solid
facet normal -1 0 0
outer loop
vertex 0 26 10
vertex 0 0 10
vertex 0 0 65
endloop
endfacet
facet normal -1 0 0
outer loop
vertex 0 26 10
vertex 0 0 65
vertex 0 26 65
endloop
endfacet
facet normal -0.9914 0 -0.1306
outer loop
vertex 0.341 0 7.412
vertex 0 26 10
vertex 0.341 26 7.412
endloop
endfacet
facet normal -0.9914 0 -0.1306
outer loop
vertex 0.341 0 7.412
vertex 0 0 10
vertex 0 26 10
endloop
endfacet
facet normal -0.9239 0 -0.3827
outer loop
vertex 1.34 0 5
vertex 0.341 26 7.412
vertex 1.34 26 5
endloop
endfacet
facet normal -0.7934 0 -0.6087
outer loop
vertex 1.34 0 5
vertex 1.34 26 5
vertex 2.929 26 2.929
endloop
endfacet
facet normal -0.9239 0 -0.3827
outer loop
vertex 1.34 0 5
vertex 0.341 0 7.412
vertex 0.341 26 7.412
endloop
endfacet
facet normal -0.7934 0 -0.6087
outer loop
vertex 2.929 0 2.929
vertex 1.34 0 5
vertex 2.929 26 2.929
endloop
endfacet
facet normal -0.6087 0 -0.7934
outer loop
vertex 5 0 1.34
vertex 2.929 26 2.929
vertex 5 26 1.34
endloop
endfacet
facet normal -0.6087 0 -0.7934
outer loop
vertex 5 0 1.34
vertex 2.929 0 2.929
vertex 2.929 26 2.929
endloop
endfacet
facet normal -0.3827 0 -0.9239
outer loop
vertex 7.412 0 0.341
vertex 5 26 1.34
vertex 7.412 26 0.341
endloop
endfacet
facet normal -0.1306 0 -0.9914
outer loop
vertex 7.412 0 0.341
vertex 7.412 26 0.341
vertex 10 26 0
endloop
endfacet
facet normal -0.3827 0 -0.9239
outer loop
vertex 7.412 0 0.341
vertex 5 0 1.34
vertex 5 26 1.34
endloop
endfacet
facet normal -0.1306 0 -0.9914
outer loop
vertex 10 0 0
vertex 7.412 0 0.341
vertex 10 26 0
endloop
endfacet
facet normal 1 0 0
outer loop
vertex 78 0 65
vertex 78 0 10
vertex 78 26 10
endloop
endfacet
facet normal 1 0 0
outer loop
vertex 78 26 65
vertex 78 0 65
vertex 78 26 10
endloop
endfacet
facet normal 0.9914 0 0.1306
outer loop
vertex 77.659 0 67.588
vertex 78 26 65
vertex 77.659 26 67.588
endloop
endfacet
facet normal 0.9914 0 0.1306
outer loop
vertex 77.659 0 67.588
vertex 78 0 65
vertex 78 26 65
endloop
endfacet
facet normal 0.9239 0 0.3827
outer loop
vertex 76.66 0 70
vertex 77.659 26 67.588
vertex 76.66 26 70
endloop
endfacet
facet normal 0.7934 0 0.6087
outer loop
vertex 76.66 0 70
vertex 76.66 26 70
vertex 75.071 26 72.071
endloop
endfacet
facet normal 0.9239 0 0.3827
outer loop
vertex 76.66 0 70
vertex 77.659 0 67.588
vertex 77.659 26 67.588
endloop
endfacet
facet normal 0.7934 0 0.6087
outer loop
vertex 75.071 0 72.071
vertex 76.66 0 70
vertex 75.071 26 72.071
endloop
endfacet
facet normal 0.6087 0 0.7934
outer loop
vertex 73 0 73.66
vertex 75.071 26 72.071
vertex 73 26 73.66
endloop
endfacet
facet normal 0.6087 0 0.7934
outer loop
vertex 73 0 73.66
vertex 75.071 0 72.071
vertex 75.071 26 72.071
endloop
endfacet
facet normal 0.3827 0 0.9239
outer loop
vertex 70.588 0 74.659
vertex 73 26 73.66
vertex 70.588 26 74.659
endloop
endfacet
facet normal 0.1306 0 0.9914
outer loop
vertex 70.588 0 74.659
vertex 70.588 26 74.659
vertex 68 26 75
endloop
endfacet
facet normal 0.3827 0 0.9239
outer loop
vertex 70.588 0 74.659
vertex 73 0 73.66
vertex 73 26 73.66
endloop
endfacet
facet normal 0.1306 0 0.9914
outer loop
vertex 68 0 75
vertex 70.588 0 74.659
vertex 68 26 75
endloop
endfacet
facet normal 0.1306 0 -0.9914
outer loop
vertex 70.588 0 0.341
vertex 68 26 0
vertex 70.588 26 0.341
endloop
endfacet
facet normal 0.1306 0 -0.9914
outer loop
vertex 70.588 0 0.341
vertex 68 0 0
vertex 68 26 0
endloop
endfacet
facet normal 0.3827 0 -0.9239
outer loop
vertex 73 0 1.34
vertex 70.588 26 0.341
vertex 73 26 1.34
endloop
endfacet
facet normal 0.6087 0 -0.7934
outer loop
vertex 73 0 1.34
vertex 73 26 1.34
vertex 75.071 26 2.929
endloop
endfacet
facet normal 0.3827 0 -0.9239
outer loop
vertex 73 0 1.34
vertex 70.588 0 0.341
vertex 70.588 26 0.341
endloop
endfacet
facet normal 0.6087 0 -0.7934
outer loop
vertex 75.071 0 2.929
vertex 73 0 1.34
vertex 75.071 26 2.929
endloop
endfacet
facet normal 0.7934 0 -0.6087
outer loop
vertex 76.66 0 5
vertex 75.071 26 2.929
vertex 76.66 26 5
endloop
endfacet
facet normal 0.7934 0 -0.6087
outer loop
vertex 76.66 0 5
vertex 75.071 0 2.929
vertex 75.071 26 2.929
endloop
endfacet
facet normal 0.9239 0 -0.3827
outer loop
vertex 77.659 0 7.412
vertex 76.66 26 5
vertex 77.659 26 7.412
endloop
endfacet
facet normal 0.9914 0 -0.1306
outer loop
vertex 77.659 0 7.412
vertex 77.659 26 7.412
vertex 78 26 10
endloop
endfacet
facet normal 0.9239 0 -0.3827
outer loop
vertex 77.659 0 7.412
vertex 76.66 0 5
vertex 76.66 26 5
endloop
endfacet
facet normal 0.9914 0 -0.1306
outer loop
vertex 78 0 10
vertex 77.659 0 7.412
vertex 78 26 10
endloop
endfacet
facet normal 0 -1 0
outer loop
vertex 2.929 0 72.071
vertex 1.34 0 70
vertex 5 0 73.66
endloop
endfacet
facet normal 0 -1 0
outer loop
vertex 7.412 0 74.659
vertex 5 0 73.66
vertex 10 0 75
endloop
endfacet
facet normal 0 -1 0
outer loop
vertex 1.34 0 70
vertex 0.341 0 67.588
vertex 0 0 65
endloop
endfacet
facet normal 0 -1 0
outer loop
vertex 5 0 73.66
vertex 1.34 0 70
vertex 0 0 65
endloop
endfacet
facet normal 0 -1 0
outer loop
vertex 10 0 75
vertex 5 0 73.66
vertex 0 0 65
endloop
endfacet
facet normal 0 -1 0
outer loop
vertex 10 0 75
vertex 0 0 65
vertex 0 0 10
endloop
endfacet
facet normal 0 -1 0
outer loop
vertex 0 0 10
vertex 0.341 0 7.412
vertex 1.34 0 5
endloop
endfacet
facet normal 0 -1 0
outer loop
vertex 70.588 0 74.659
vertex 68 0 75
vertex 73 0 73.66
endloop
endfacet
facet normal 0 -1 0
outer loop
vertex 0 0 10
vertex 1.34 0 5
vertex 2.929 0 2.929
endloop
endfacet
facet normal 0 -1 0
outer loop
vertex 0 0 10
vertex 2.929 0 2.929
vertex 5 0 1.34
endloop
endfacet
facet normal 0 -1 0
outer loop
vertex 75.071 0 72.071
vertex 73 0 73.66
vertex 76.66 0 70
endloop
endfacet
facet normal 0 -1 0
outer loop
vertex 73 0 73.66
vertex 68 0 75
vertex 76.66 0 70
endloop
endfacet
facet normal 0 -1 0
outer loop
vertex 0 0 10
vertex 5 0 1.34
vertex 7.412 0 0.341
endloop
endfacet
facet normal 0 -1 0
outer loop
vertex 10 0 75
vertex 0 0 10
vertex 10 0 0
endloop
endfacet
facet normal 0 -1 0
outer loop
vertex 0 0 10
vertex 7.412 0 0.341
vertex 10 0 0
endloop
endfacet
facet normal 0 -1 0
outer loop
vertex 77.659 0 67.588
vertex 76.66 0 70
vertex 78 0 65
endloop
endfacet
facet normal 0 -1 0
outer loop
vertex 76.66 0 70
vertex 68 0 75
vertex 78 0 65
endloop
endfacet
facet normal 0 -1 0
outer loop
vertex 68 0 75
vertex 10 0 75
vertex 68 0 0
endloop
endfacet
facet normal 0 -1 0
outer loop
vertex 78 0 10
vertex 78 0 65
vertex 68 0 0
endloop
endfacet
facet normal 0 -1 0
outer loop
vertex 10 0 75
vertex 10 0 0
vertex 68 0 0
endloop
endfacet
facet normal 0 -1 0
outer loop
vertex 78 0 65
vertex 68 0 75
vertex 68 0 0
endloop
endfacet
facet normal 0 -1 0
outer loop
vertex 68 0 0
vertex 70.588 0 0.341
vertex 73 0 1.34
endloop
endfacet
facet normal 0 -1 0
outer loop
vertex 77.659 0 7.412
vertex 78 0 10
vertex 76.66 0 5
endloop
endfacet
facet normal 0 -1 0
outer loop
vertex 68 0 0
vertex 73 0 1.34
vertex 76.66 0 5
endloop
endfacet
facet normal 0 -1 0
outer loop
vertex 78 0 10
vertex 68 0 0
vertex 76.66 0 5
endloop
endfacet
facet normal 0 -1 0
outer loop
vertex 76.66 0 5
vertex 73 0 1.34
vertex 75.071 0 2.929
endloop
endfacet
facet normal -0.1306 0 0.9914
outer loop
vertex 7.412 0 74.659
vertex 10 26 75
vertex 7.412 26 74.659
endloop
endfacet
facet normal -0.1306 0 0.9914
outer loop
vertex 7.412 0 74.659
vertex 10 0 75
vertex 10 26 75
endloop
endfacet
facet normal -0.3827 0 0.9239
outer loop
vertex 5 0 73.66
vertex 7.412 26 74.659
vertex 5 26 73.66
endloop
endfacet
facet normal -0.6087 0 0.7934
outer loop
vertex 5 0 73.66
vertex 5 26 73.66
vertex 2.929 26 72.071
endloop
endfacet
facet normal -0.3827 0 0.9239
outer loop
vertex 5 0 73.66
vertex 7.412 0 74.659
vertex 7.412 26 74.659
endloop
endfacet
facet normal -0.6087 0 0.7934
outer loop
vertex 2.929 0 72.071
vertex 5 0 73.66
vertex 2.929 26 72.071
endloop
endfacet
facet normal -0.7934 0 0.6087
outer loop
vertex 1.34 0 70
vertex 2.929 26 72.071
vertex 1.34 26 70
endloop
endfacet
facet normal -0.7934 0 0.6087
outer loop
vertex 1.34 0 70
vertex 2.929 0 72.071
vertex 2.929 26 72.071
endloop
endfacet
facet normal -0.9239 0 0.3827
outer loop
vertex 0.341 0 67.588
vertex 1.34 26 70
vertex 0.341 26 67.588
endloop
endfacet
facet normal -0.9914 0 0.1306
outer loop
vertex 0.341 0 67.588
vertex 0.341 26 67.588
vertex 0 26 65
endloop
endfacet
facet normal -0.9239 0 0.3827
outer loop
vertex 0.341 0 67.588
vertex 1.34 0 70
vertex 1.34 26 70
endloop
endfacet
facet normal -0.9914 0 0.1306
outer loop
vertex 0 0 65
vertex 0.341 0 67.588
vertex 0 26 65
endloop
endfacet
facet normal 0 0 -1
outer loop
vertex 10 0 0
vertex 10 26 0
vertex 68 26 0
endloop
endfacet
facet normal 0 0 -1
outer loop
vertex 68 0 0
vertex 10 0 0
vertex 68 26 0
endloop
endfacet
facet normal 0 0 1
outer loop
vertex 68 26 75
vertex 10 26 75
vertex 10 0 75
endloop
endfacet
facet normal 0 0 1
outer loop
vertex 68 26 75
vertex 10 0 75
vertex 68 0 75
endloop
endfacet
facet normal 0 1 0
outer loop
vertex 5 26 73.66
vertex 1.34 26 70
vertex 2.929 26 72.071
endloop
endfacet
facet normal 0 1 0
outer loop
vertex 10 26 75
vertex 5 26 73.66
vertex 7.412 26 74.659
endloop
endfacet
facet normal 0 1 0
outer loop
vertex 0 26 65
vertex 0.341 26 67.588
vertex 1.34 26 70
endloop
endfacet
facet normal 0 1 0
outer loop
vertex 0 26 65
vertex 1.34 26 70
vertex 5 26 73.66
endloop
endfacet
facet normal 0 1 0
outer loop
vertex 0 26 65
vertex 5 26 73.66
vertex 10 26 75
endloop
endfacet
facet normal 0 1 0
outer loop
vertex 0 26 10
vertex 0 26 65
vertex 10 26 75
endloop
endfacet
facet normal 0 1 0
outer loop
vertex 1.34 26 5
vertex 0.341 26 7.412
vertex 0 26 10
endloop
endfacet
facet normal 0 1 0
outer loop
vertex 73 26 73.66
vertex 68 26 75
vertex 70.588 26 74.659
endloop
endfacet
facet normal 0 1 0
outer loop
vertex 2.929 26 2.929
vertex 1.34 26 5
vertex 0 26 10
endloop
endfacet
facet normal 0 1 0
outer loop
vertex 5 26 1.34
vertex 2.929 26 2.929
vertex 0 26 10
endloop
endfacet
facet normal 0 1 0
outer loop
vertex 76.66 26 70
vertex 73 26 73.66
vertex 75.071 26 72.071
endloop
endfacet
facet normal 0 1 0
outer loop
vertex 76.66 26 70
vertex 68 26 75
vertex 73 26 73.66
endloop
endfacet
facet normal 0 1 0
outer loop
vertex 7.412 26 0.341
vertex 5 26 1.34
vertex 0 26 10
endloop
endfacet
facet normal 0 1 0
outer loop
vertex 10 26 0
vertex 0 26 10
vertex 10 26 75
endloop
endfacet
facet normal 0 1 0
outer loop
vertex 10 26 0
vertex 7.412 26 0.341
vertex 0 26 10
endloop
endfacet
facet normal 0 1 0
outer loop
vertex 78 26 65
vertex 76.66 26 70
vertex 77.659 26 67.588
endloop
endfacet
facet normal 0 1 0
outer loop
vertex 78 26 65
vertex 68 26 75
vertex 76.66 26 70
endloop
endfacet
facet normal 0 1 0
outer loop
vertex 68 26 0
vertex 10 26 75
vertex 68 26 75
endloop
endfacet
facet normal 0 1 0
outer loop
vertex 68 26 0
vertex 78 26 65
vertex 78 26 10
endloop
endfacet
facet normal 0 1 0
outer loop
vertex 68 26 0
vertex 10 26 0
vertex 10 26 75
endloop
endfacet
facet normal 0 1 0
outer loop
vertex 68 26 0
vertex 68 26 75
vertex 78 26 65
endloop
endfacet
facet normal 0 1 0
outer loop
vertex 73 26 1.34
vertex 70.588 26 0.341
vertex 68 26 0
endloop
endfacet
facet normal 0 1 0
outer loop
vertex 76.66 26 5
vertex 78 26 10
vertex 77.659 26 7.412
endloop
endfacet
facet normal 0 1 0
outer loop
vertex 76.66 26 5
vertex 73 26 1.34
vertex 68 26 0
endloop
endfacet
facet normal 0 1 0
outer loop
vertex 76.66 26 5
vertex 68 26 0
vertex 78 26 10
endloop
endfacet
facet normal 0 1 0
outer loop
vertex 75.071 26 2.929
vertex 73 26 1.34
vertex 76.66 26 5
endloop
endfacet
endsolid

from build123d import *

# Parameters (mm, degrees)
CYLINDER005_W          = 10
CYLINDER005_H          = 26
CYLINDER005_ANGLE      = 90
BOX004_W               = 10
BOX004_H               = 26
BOX004_DEPTH           = 10
CUT002_PLACEMENT_ANGLE = 90
CYLINDER006_W          = 10
CYLINDER006_H          = 26
CYLINDER006_ANGLE      = 90
BOX005_W               = 10
BOX005_H               = 26
BOX005_DEPTH           = 10
CUT003_PLACEMENT_ANGLE = 180
CYLINDER007_W          = 10
CYLINDER007_H          = 26
CYLINDER007_ANGLE      = 90
BOX006_W               = 10
BOX006_H               = 26
BOX006_DEPTH           = 10
CUT004_PLACEMENT_ANGLE = 90
CYLINDER004_W          = 10
CYLINDER004_H          = 26
CYLINDER004_ANGLE      = 90
BOX003_W               = 10
BOX003_H               = 26
BOX003_DEPTH           = 10
BOX002_W               = 78
BOX002_H               = 26
BOX002_DEPTH           = 75


with BuildPart() as cylinder005:
    # Cylinder005 → Cylinder005 (revolve)
    with BuildSketch(Plane(origin=(0, 26, 0), x_dir=(1, 0, 0), z_dir=(0, 0, -1))):
        with Locations((5, 13)):
            Rectangle(CYLINDER005_W, CYLINDER005_H)
    revolve(axis=Axis((0, 26, 0), (0, -1, 0)), revolution_arc=CYLINDER005_ANGLE)


with BuildPart() as cut002:
    # Box004 → Box004 (new body)
    with BuildSketch(Plane.XY):
        with Locations((5, 13)):
            Rectangle(BOX004_W, BOX004_H)
    extrude(amount=BOX004_DEPTH)

    # Cut002: cut Cylinder005
    add(cylinder005.part, mode=Mode.SUBTRACT)


with BuildPart() as cut002_1:
    # Cut002 placement: moved
    add(cut002.part.moved(Location((68, 0, 10))).rotate(Axis((68, 0, 10), (0, 1, 0)), CUT002_PLACEMENT_ANGLE))


with BuildPart() as cylinder006:
    # Cylinder006 → Cylinder006 (revolve)
    with BuildSketch(Plane(origin=(0, 26, 0), x_dir=(1, 0, 0), z_dir=(0, 0, -1))):
        with Locations((5, 13)):
            Rectangle(CYLINDER006_W, CYLINDER006_H)
    revolve(axis=Axis((0, 26, 0), (0, -1, 0)), revolution_arc=CYLINDER006_ANGLE)


with BuildPart() as cut003:
    # Box005 → Box005 (new body)
    with BuildSketch(Plane.XY):
        with Locations((5, 13)):
            Rectangle(BOX005_W, BOX005_H)
    extrude(amount=BOX005_DEPTH)

    # Cut003: cut Cylinder006
    add(cylinder006.part, mode=Mode.SUBTRACT)


with BuildPart() as cut003_1:
    # Cut003 placement: moved
    add(cut003.part.moved(Location((10, 0, 10))).rotate(Axis((10, 0, 10), (0, 1, 0)), CUT003_PLACEMENT_ANGLE))


with BuildPart() as cylinder007:
    # Cylinder007 → Cylinder007 (revolve)
    with BuildSketch(Plane(origin=(0, 26, 0), x_dir=(1, 0, 0), z_dir=(0, 0, -1))):
        with Locations((5, 13)):
            Rectangle(CYLINDER007_W, CYLINDER007_H)
    revolve(axis=Axis((0, 26, 0), (0, -1, 0)), revolution_arc=CYLINDER007_ANGLE)


with BuildPart() as cut004:
    # Box006 → Box006 (new body)
    with BuildSketch(Plane.XY):
        with Locations((5, 13)):
            Rectangle(BOX006_W, BOX006_H)
    extrude(amount=BOX006_DEPTH)

    # Cut004: cut Cylinder007
    add(cylinder007.part, mode=Mode.SUBTRACT)


with BuildPart() as cut004_1:
    # Cut004 placement: moved
    add(cut004.part.moved(Location((10, 0, 65))).rotate(Axis((10, 0, 65), (0, -1, 0)), CUT004_PLACEMENT_ANGLE))


with BuildPart() as cylinder004:
    # Cylinder004 → Cylinder004 (revolve)
    with BuildSketch(Plane(origin=(0, 26, 0), x_dir=(1, 0, 0), z_dir=(0, 0, -1))):
        with Locations((5, 13)):
            Rectangle(CYLINDER004_W, CYLINDER004_H)
    revolve(axis=Axis((0, 26, 0), (0, -1, 0)), revolution_arc=CYLINDER004_ANGLE)


with BuildPart() as v25cuts:
    # Box003 → Box003 (new body)
    with BuildSketch(Plane.XY):
        with Locations((5, 13)):
            Rectangle(BOX003_W, BOX003_H)
    extrude(amount=BOX003_DEPTH)

    # Cut001: cut Cylinder004
    add(cylinder004.part, mode=Mode.SUBTRACT)


with BuildPart() as v25cuts_1:
    # Cut001 placement: moved
    add(v25cuts.part.moved(Location((68, 0, 65))))

    # Fusion004: union Cut002, Cut003, Cut004
    add(cut002_1.part)
    add(cut003_1.part)
    add(cut004_1.part)


with BuildPart() as v25b001:
    # Box002 → Box002 (new body)
    with BuildSketch(Plane.XY):
        with Locations((39, 13)):
            Rectangle(BOX002_W, BOX002_H)
    extrude(amount=BOX002_DEPTH)

    # Cut005: cut v25Cuts
    add(v25cuts_1.part, mode=Mode.SUBTRACT)


solid = v25b001.part
